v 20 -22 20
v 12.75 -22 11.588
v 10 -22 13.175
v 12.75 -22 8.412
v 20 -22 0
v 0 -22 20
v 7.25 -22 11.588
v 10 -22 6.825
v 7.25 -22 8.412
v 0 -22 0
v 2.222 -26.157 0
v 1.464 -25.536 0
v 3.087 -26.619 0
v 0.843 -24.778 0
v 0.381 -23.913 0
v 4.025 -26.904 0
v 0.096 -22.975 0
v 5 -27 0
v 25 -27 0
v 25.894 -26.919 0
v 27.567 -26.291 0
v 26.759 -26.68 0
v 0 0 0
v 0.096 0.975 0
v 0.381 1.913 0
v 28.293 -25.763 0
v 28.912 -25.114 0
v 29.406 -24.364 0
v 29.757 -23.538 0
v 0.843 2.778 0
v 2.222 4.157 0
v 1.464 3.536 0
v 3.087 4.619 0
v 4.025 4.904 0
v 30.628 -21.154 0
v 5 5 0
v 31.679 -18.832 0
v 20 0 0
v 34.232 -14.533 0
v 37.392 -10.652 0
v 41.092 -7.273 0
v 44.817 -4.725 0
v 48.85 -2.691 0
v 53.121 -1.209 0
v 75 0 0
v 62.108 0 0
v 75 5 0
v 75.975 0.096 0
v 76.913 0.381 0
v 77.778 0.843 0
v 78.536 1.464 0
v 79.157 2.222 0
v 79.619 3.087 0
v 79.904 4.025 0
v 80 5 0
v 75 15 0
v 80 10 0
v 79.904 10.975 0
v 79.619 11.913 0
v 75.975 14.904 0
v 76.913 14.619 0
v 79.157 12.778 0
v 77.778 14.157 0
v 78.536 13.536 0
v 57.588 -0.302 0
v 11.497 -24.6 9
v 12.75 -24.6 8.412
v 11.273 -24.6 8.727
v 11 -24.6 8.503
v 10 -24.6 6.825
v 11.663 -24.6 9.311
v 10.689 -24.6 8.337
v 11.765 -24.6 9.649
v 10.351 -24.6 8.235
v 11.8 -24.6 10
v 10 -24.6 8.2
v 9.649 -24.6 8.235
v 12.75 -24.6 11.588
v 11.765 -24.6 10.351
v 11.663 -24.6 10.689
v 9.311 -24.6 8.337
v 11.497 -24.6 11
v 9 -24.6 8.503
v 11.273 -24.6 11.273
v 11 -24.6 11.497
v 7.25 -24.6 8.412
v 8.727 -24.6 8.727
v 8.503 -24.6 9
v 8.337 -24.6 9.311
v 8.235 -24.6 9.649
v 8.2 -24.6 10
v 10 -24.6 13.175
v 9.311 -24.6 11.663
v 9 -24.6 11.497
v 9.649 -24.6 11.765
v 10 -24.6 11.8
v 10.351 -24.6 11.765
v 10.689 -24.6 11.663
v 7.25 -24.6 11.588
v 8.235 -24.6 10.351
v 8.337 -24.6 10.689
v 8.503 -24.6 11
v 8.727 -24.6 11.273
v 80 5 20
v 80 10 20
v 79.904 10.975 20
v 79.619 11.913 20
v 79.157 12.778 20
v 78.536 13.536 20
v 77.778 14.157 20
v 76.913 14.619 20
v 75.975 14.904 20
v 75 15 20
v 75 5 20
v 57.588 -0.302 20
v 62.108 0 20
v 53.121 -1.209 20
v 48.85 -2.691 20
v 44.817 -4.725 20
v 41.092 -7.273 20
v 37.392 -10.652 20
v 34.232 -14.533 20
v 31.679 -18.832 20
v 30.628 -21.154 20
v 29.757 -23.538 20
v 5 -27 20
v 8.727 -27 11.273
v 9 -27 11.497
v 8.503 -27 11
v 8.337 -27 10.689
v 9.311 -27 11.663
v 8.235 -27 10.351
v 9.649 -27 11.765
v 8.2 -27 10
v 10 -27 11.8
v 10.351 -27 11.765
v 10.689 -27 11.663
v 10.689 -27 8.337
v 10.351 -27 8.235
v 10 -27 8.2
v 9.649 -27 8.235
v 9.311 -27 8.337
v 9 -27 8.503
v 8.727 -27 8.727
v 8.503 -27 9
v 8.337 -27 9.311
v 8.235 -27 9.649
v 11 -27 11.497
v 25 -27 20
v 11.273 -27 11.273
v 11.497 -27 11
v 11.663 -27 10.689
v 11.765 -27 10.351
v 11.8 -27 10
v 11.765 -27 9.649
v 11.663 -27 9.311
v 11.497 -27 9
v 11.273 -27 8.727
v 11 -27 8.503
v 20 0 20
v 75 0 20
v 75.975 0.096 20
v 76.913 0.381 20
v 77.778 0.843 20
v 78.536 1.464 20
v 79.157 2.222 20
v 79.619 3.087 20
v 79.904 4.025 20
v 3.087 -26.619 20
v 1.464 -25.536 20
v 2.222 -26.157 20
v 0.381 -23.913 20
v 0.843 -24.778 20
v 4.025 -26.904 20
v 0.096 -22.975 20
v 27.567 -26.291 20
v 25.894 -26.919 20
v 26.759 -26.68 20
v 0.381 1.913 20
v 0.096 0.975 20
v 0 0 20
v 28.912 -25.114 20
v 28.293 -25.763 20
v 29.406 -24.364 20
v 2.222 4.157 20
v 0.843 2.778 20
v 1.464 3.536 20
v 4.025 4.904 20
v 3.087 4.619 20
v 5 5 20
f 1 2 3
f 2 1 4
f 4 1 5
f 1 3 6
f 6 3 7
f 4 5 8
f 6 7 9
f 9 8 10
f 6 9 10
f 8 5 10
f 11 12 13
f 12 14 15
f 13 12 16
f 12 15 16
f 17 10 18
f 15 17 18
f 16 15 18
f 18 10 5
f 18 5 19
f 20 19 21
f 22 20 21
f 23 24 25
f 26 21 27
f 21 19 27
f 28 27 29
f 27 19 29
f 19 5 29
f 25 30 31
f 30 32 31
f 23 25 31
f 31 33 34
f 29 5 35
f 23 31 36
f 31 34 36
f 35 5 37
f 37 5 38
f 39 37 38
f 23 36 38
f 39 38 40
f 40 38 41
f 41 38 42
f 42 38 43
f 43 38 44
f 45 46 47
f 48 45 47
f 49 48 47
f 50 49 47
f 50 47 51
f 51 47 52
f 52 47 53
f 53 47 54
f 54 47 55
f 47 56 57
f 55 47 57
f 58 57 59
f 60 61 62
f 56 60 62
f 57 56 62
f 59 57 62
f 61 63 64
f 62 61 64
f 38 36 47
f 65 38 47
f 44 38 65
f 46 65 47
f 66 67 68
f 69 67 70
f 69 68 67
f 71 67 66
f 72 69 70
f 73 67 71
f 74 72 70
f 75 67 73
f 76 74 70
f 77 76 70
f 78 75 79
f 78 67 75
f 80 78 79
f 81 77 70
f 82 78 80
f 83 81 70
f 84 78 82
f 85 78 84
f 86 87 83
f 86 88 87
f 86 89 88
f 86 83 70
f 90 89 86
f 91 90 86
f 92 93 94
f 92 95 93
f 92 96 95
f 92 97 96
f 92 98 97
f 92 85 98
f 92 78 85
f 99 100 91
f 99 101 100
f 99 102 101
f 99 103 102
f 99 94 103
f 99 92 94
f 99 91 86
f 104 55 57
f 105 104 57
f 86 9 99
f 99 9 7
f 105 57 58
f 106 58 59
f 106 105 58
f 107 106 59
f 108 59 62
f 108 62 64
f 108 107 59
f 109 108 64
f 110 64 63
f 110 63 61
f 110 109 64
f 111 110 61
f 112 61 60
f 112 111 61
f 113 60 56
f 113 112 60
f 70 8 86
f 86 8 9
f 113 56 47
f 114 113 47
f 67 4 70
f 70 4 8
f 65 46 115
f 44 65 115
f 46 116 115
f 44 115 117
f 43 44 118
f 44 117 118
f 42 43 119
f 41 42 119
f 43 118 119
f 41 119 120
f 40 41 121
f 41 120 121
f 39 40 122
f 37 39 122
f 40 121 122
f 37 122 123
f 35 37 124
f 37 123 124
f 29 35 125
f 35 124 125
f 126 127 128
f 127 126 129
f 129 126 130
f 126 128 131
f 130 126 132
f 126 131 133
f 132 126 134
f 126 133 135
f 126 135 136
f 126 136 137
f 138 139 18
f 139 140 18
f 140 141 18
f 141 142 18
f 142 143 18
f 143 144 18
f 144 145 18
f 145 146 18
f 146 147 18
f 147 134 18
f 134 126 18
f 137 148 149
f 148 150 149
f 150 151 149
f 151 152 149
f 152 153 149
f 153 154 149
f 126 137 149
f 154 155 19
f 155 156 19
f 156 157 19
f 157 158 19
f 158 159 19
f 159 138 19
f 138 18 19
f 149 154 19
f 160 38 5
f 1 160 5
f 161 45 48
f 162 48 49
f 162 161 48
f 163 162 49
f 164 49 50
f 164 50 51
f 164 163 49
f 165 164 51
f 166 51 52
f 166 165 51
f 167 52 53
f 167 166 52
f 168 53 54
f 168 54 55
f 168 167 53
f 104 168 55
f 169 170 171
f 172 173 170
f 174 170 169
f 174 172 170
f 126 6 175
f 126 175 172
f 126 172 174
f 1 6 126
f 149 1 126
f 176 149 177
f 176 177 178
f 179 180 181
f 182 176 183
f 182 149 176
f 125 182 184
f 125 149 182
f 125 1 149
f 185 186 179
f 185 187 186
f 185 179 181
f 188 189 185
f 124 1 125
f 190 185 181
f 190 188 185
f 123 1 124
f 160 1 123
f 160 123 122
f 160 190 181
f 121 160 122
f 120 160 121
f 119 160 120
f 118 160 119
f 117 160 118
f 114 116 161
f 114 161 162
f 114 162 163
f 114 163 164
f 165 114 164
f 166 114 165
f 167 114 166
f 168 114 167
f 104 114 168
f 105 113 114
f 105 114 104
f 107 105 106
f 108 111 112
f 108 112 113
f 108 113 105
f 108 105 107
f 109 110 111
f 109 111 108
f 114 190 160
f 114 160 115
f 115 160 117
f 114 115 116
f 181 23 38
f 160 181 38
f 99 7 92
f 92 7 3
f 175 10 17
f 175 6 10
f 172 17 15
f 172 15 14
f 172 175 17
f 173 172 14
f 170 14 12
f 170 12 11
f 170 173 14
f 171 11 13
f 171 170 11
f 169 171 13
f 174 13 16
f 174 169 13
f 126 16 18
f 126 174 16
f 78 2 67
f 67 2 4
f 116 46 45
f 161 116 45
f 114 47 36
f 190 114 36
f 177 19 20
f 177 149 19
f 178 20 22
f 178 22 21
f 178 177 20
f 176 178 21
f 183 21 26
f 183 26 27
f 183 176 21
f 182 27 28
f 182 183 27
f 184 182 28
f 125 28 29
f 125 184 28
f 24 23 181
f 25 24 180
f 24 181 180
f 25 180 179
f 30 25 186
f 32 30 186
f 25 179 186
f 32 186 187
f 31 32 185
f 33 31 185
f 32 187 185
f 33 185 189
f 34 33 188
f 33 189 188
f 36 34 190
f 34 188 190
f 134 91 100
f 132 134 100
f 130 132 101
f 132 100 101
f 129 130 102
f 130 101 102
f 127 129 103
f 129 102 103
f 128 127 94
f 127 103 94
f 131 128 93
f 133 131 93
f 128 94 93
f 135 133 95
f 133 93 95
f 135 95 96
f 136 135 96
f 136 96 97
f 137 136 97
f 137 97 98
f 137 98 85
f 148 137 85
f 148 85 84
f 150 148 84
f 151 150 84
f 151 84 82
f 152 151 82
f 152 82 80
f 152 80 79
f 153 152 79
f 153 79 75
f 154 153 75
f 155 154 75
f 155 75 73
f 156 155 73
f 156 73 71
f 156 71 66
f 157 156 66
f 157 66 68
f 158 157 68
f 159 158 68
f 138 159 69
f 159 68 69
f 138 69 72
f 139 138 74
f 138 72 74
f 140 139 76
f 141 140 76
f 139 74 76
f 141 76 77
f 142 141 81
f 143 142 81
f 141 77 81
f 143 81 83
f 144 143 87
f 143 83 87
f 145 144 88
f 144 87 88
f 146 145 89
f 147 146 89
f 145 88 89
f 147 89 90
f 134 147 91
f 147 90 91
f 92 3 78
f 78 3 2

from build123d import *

# Parameters (mm, degrees)
F3_DEPTH = 20
F4_R     = 4.99999
F6_DEPTH = 2.6
F7_D     = 3.6
F7_DEPTH = 10
F7_TIP   = 1.0815491142
F8_R     = 34


# Not quite as in the source:
# - a fillet or chamfer is up to 0.001 mm smaller than in the source, because OpenCascade refuses the exact size


with BuildPart() as f3:
    # F2 (on Top) → F3 (new body)
    with BuildSketch(Plane.XY):
        Polygon((0, 5), (0, 0), (20, 0), (20, -22), (0, -22), (0, -27), (30, -27), (30, 0), (80, 0), (80, 15), (75, 15), (75, 5), align=None)
    extrude(amount=F3_DEPTH)

    # F4 (radius 5 in the source; OpenCascade refuses exactly that, so slightly less here)
    f4_edges = [f3.edges().sort_by_distance(p)[0] for p in [
        (30, -27, 10),
        (80, 0, 10),
        (80, 15, 10),
        (0, 5, 10),
        (0, -27, 10),
    ]]
    fillet(f4_edges, radius=F4_R)

    # F5 (on face) → F6 (cut)
    with BuildSketch(Plane(origin=(0, -22, 0), x_dir=(-1, 0, 0), z_dir=(0, 1, 0))):
        Polygon((-7.25, 8.4122867597), (-7.25, 11.5877132403), (-10, 13.1754264805), (-12.75, 11.5877132403), (-12.75, 8.4122867597), (-10, 6.8245735195), align=None)
    extrude(amount=-F6_DEPTH, mode=Mode.SUBTRACT)

    # F7 (one way)
    with BuildSketch(Plane(origin=(0, -22, 0), x_dir=(-1, 0, 0), z_dir=(0, 1, 0))):
        with Locations((-10, 10)):
            Circle(F7_D / 2)
    extrude(amount=-F7_DEPTH, mode=Mode.SUBTRACT)
    with Locations(Plane(origin=(0, -22, 0), x_dir=(-1, 0, 0), z_dir=(0, 1, 0))):
        with Locations((-10, 10)):
            with Locations((0, 0, -(F7_DEPTH + F7_TIP / 2))):  # 118° drill point
                Cone(0, F7_D / 2, F7_TIP, mode=Mode.SUBTRACT)

    # F8
    f8_edges = [f3.edges().sort_by_distance(p)[0] for p in [
        (30, 0, 10),
    ]]
    fillet(f8_edges, radius=F8_R)


solid = f3.part
